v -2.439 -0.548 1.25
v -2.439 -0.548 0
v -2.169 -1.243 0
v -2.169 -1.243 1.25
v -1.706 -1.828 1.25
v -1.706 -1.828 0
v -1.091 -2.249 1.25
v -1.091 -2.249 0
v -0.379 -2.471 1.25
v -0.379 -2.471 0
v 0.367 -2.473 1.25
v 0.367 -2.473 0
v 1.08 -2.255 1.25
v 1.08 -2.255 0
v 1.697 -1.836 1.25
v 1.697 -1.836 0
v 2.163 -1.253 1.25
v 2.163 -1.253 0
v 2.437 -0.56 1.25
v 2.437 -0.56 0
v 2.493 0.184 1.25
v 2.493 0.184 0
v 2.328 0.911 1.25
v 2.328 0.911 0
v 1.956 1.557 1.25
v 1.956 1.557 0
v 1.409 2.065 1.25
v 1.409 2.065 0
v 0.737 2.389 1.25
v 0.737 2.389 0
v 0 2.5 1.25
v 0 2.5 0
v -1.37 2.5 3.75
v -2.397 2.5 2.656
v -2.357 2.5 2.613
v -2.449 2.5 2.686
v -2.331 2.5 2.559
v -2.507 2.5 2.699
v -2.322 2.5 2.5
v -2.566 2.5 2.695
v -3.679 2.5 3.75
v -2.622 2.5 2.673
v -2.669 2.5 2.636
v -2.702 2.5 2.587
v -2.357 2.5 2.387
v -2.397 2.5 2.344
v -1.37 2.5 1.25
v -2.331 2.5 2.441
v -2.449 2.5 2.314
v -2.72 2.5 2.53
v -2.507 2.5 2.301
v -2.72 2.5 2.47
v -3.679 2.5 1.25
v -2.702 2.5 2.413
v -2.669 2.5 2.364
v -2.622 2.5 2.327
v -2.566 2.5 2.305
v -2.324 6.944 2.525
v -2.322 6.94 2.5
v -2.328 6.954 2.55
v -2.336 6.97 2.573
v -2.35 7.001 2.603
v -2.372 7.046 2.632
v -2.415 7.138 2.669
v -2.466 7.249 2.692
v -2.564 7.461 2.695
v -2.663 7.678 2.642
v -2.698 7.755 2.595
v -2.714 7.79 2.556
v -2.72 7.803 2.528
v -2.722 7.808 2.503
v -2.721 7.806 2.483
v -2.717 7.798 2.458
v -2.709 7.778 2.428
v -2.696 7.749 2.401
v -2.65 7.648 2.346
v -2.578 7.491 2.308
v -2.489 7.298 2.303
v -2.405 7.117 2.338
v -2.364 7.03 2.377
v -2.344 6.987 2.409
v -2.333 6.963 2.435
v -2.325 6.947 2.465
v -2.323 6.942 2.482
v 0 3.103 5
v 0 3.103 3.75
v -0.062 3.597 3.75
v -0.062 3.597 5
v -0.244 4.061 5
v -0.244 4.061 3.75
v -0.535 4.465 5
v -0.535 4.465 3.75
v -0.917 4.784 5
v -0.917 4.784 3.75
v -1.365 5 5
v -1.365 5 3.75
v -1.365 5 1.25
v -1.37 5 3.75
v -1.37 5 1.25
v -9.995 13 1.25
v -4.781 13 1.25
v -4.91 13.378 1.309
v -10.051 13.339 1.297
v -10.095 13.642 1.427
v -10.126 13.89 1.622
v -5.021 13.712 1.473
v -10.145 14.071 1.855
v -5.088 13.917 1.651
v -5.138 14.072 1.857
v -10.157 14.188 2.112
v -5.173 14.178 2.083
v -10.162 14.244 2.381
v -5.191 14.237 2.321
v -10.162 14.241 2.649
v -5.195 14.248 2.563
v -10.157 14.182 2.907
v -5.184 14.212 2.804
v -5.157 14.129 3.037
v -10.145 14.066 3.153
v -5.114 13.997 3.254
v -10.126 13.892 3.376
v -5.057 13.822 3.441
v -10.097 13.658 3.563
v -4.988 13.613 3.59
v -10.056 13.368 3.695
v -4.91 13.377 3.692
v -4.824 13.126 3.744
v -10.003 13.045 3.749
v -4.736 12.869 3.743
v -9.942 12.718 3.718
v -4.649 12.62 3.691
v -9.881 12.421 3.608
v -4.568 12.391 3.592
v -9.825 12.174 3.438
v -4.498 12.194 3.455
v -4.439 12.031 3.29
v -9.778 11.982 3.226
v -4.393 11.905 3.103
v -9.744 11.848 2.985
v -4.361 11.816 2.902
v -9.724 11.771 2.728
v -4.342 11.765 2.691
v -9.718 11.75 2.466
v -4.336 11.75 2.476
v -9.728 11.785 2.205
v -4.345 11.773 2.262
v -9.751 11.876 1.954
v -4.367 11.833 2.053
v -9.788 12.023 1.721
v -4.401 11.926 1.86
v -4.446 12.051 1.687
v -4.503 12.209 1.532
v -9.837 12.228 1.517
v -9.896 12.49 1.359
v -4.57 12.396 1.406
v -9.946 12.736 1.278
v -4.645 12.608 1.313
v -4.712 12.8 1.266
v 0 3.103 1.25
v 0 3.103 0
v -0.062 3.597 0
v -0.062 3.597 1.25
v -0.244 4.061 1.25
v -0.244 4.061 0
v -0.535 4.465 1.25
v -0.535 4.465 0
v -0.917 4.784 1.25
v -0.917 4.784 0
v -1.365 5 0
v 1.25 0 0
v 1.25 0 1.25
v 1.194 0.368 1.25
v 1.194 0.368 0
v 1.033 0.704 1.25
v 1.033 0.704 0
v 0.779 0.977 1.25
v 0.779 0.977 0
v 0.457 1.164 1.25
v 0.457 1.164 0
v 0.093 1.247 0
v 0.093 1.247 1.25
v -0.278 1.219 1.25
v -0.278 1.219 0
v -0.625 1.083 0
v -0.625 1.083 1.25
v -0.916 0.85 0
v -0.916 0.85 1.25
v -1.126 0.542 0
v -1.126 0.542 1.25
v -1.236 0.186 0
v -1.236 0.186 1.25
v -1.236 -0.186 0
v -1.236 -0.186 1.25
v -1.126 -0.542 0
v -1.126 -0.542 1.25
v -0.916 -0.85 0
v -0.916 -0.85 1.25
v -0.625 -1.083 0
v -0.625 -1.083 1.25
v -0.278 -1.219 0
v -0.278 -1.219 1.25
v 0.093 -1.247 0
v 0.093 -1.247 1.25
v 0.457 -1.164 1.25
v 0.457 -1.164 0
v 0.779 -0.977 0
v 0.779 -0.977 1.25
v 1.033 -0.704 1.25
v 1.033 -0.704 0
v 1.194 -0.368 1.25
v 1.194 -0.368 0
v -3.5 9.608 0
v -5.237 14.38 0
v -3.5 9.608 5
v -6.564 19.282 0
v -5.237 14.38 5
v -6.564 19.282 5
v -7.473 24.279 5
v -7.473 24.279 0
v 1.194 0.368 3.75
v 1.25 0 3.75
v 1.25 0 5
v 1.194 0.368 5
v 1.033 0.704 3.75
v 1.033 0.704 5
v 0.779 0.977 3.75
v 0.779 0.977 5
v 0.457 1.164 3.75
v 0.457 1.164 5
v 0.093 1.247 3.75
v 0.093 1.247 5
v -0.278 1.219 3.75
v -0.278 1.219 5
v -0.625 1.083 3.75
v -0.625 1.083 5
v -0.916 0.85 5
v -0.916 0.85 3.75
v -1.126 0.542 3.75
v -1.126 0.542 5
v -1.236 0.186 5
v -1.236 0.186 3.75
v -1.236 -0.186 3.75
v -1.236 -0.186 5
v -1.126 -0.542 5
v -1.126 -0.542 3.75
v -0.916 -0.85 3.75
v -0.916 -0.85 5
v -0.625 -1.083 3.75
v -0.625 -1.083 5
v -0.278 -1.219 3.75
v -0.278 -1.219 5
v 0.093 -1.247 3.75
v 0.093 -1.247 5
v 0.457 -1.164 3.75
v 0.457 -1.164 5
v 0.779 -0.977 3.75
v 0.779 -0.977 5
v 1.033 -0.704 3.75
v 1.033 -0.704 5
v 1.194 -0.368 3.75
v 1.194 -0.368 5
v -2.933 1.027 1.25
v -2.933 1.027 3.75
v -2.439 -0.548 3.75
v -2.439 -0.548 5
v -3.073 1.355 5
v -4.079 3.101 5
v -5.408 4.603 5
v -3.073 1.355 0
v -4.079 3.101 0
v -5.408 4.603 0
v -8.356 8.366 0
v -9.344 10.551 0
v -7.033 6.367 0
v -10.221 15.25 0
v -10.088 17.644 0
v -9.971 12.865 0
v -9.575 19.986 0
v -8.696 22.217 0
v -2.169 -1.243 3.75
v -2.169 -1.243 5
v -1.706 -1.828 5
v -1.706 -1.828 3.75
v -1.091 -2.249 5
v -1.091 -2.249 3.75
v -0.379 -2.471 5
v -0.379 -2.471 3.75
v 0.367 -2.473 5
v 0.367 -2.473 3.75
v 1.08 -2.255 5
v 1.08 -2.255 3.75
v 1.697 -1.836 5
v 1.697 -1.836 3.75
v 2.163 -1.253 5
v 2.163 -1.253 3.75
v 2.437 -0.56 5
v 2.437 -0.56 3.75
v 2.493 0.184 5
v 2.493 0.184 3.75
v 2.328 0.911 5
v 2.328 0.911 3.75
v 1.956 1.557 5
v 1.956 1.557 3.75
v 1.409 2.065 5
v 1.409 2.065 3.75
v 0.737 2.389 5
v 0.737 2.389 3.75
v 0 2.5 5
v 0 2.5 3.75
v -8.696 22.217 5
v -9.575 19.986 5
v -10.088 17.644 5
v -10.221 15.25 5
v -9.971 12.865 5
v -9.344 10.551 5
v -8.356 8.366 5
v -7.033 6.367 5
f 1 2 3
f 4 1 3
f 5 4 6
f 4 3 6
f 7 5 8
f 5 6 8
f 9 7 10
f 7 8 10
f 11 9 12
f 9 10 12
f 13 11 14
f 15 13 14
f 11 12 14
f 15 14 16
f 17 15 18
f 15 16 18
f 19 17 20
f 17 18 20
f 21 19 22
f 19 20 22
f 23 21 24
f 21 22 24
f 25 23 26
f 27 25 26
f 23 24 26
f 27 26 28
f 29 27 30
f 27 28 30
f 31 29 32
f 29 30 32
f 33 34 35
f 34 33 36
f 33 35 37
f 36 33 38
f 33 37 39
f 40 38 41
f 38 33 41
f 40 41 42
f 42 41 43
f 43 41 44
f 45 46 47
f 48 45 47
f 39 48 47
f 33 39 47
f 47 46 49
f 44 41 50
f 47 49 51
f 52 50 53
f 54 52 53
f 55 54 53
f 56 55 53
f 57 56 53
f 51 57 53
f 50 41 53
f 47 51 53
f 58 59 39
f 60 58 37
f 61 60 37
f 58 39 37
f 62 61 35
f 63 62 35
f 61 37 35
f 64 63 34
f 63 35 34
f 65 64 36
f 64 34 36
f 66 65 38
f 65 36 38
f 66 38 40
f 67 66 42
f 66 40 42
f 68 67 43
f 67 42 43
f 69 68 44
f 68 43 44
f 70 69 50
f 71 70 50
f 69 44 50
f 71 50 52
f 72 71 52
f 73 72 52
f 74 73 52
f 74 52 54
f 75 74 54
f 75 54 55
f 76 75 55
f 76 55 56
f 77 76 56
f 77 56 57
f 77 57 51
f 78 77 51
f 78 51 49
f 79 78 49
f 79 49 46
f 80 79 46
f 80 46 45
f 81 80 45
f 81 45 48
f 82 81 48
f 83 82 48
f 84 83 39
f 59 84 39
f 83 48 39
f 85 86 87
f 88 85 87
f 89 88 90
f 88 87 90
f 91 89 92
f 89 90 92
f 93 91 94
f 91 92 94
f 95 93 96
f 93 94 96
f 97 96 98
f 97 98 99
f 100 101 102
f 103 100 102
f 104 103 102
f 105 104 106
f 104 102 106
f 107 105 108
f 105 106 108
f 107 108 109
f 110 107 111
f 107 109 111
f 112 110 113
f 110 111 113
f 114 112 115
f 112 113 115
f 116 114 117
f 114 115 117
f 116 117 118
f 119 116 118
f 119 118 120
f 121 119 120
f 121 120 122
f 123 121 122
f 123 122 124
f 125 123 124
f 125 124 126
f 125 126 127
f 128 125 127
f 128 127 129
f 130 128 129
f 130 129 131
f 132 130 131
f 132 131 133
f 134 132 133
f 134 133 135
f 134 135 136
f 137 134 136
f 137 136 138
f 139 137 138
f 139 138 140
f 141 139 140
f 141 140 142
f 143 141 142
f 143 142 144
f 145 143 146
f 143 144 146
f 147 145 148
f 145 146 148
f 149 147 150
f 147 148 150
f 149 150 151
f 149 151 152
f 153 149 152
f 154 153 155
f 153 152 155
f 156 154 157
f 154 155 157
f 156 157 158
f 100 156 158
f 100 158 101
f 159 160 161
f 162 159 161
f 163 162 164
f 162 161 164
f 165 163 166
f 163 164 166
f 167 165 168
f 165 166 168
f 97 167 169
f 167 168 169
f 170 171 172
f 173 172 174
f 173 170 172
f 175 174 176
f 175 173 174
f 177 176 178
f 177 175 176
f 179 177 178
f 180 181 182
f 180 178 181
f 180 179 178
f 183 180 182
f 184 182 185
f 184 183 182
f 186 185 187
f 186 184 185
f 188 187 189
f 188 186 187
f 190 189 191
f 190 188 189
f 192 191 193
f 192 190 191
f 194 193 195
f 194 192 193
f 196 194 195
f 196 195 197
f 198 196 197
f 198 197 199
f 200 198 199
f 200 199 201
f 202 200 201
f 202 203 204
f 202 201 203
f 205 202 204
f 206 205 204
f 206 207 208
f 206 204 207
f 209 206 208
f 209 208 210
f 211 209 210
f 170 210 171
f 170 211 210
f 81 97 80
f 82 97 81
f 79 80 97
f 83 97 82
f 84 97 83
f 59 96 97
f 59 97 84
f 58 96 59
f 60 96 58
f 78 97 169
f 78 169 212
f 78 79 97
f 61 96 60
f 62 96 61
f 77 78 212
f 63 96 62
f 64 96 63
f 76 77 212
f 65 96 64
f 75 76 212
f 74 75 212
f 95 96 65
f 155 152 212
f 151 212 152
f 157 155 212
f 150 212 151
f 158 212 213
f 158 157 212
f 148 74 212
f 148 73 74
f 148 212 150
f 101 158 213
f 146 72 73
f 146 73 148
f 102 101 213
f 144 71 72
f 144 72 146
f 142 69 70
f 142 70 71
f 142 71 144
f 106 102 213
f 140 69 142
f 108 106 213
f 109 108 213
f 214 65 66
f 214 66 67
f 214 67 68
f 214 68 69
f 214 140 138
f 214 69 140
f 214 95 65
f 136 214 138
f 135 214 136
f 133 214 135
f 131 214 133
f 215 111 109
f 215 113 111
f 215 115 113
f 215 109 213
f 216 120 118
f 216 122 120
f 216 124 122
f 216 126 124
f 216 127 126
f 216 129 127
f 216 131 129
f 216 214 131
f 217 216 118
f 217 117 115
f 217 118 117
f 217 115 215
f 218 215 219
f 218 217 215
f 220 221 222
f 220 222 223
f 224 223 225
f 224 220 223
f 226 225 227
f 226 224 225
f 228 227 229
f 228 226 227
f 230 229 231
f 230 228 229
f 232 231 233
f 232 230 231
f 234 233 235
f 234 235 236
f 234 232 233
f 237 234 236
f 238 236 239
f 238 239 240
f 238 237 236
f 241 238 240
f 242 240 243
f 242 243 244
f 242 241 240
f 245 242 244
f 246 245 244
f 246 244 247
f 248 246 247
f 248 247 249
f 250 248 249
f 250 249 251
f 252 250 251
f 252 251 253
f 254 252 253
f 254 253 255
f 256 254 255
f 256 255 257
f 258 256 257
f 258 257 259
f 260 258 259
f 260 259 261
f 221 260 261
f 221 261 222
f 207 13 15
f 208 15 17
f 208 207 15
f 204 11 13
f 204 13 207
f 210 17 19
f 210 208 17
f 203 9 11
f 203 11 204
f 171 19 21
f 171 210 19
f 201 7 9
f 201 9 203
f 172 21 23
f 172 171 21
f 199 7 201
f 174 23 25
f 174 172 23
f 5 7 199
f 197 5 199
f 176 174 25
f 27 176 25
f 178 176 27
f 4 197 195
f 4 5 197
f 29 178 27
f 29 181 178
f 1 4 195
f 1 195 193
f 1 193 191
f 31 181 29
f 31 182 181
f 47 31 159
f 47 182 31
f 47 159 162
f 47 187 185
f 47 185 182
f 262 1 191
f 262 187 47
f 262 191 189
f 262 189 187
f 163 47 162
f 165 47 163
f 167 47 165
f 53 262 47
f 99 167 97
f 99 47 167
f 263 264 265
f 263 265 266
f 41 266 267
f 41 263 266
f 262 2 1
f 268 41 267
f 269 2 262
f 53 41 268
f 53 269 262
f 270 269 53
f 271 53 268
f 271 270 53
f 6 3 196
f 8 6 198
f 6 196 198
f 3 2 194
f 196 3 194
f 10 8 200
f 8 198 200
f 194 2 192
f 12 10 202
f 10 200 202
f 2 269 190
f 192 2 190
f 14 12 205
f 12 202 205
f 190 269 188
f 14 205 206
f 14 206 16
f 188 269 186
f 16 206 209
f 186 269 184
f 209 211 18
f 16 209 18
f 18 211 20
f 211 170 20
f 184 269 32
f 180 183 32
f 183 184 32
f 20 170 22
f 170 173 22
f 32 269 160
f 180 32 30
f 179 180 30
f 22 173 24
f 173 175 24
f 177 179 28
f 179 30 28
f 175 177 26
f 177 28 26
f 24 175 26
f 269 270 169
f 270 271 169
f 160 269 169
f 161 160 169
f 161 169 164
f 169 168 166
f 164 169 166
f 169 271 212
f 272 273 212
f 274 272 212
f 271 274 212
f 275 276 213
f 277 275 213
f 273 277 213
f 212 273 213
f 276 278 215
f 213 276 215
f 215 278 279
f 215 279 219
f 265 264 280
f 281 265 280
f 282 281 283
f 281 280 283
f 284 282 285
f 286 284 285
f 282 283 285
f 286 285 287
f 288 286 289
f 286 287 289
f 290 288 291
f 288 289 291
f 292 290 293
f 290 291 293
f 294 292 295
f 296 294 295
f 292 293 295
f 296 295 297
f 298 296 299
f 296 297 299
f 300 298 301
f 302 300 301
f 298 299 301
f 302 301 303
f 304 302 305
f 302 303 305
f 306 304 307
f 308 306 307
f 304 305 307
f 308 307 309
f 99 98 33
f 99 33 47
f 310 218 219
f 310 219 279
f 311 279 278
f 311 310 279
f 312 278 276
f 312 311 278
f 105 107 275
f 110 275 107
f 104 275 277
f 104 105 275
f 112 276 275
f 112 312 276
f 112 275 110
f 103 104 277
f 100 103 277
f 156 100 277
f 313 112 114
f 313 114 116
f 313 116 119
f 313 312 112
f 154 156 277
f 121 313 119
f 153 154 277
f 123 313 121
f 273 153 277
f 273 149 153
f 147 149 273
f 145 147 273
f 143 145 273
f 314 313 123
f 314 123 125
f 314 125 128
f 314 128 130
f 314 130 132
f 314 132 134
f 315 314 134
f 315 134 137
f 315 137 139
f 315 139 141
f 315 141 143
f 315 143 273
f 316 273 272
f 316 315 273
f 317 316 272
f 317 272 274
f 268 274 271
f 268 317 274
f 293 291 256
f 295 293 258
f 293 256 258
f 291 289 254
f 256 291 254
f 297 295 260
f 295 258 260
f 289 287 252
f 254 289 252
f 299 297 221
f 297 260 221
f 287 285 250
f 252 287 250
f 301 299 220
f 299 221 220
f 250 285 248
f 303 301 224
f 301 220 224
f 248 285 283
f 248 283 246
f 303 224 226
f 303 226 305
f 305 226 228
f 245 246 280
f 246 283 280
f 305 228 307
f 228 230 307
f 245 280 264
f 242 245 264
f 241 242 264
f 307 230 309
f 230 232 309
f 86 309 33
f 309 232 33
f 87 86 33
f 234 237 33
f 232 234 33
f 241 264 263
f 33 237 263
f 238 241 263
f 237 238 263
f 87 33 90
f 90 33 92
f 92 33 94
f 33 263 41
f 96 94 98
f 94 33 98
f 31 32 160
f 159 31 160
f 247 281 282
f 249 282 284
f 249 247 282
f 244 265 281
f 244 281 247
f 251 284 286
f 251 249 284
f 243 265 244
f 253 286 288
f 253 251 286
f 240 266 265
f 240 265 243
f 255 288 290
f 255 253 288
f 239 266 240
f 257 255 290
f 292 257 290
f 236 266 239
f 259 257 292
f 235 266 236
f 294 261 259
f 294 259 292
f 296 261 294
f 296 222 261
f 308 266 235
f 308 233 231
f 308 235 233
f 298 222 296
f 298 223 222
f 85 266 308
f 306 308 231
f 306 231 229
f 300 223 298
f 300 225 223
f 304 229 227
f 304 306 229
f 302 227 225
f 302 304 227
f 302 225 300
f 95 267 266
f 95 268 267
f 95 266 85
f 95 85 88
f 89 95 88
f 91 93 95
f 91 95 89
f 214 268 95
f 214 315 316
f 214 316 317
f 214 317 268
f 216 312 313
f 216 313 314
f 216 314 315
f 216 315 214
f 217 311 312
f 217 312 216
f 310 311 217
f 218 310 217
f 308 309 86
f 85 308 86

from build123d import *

# Parameters (mm, degrees)
SKETCH1_R               = 1.25
BOSS_EXTRUDE1_DEPTH     = 5
BOSS_EXTRUDE2_DEPTH     = 5
FILLET2_R               = 10
CUT_EXTRUDE2_DEPTH      = 27.814458153
CUT_EXTRUDE2_DEPTH_BACK = 27.814458153
SKETCH4_W               = 2.5
SKETCH4_H               = 5
SKETCH5_W               = 2.5
SKETCH5_H               = 2.5
CUT_EXTRUDE3_DEPTH      = 1.37
FILLET3_R               = 2
SKETCH6_R               = 1.25
CUT_EXTRUDE4_DEPTH      = 27.814458153
SKETCH7_R               = 0.2
CUT_EXTRUDE5_DEPTH      = 25.573800354


with BuildPart() as part:
    # Sketch1 → Boss-Extrude1 (new body)
    with BuildSketch(Plane.XY):
        with BuildLine():
            Line((0, 2.5), (0, 5))
            Line((0, 5), (-2.5, 5))
            Line((-2.5, 5), (-2.5, 0))
            ThreePointArc((-2.5, 0), (1.767766953, -1.767766953), (0, 2.5))
        make_face()
        Circle(SKETCH1_R, mode=Mode.SUBTRACT)
    extrude(amount=BOSS_EXTRUDE1_DEPTH)

    # Sketch2 → Boss-Extrude2 (add)
    with BuildSketch(Plane.XY.offset(5)):
        with BuildLine():
            Line((-2.5, 2.5), (0, 2.5))
            ThreePointArc((0, 2.5), (-4.79077334, 13.027539424), (-7.472558856, 24.278700341))
            ThreePointArc((-7.472558856, 24.278700341), (-9.849121132, 12.279055883), (-2.5, 2.5))
        make_face()
    extrude(amount=-BOSS_EXTRUDE2_DEPTH)

    # Fillet2
    fillet2_edges = [part.edges().sort_by_distance(p)[0] for p in [
        (-2.5, 2.5, 2.5),
    ]]
    fillet(fillet2_edges, radius=FILLET2_R)

    # Sketch4 → Cut-Extrude2 (cut, two sides: drawn at the far end of the back side and taken through both)
    with BuildSketch(Plane(origin=(0, 0, 0), x_dir=(0, 0, -1), z_dir=(1, 0, 0)).offset(-CUT_EXTRUDE2_DEPTH_BACK)):
        with Locations((-2.5, 0)):
            Rectangle(SKETCH4_W, SKETCH4_H)
    extrude(amount=CUT_EXTRUDE2_DEPTH + CUT_EXTRUDE2_DEPTH_BACK, mode=Mode.SUBTRACT)

    # Sketch5 → Cut-Extrude3 (cut)
    with BuildSketch(Plane(origin=(0, 0, 0), x_dir=(0, 0, -1), z_dir=(1, 0, 0))):
        with Locations((-2.5, 3.75)):
            Rectangle(SKETCH5_W, SKETCH5_H)
    extrude(amount=-CUT_EXTRUDE3_DEPTH, mode=Mode.SUBTRACT)

    # Fillet3
    # the kernel refuses this fillet: 2 mm, written as the material it takes off along each edge
    with BuildSketch(Plane(origin=(0, 5, -4.741540982), x_dir=(0, -1, 0), z_dir=(0, 0, 1))) as fillet3_piece_1:
        with BuildLine():
            CenterArc((1.896616393, -2), FILLET3_R, 90, 71.497208819)
            Line((0, -1.365298292), (-0.037932328, -1.352604258))
            ThreePointArc((-0.037932328, -1.352604258), (-0.04, -0.682649146), (-0.04, 0))
            Line((-0.04, 0), (0, 0.04))
            Line((0, 0.04), (1.896616393, 0.04))
            Line((1.896616393, 0.04), (1.896616393, 0))
        make_face()
    extrude(amount=10.733081965, mode=Mode.SUBTRACT)
    with BuildSketch(Plane(origin=(0, 5, -0.991540982), x_dir=(-1, 0, 0), z_dir=(0, 0, 1))) as fillet3_piece_2:
        with BuildLine():
            CenterArc((2, 1.896616393), FILLET3_R, 180, 71.497208819)
            Line((0, 1.896616393), (-0.04, 1.896616393))
            Line((-0.04, 1.896616393), (-0.04, 0))
            Line((-0.04, 0), (0, -0.04))
            ThreePointArc((0, -0.04), (0.682649146, -0.04), (1.352604258, -0.037932328))
            Line((1.352604258, -0.037932328), (1.365298292, 0))
        make_face()
    extrude(amount=10.733081965, mode=Mode.SUBTRACT)

    # Sketch6 → Cut-Extrude4 (cut, through all)
    with BuildSketch(Plane(origin=(0, 0, 0), x_dir=(0, 0, -1), z_dir=(1, 0, 0))):
        with Locations((-2.5, 13)):
            Circle(SKETCH6_R)
    extrude(amount=-CUT_EXTRUDE4_DEPTH, mode=Mode.SUBTRACT)

    # Sketch7 → Cut-Extrude5 (cut, through all)
    with BuildSketch(Plane.XZ.offset(-2.5)):
        with Locations((-2.521961644, 2.5)):
            Circle(SKETCH7_R)
    extrude(amount=-CUT_EXTRUDE5_DEPTH, mode=Mode.SUBTRACT)


solid = part.part
